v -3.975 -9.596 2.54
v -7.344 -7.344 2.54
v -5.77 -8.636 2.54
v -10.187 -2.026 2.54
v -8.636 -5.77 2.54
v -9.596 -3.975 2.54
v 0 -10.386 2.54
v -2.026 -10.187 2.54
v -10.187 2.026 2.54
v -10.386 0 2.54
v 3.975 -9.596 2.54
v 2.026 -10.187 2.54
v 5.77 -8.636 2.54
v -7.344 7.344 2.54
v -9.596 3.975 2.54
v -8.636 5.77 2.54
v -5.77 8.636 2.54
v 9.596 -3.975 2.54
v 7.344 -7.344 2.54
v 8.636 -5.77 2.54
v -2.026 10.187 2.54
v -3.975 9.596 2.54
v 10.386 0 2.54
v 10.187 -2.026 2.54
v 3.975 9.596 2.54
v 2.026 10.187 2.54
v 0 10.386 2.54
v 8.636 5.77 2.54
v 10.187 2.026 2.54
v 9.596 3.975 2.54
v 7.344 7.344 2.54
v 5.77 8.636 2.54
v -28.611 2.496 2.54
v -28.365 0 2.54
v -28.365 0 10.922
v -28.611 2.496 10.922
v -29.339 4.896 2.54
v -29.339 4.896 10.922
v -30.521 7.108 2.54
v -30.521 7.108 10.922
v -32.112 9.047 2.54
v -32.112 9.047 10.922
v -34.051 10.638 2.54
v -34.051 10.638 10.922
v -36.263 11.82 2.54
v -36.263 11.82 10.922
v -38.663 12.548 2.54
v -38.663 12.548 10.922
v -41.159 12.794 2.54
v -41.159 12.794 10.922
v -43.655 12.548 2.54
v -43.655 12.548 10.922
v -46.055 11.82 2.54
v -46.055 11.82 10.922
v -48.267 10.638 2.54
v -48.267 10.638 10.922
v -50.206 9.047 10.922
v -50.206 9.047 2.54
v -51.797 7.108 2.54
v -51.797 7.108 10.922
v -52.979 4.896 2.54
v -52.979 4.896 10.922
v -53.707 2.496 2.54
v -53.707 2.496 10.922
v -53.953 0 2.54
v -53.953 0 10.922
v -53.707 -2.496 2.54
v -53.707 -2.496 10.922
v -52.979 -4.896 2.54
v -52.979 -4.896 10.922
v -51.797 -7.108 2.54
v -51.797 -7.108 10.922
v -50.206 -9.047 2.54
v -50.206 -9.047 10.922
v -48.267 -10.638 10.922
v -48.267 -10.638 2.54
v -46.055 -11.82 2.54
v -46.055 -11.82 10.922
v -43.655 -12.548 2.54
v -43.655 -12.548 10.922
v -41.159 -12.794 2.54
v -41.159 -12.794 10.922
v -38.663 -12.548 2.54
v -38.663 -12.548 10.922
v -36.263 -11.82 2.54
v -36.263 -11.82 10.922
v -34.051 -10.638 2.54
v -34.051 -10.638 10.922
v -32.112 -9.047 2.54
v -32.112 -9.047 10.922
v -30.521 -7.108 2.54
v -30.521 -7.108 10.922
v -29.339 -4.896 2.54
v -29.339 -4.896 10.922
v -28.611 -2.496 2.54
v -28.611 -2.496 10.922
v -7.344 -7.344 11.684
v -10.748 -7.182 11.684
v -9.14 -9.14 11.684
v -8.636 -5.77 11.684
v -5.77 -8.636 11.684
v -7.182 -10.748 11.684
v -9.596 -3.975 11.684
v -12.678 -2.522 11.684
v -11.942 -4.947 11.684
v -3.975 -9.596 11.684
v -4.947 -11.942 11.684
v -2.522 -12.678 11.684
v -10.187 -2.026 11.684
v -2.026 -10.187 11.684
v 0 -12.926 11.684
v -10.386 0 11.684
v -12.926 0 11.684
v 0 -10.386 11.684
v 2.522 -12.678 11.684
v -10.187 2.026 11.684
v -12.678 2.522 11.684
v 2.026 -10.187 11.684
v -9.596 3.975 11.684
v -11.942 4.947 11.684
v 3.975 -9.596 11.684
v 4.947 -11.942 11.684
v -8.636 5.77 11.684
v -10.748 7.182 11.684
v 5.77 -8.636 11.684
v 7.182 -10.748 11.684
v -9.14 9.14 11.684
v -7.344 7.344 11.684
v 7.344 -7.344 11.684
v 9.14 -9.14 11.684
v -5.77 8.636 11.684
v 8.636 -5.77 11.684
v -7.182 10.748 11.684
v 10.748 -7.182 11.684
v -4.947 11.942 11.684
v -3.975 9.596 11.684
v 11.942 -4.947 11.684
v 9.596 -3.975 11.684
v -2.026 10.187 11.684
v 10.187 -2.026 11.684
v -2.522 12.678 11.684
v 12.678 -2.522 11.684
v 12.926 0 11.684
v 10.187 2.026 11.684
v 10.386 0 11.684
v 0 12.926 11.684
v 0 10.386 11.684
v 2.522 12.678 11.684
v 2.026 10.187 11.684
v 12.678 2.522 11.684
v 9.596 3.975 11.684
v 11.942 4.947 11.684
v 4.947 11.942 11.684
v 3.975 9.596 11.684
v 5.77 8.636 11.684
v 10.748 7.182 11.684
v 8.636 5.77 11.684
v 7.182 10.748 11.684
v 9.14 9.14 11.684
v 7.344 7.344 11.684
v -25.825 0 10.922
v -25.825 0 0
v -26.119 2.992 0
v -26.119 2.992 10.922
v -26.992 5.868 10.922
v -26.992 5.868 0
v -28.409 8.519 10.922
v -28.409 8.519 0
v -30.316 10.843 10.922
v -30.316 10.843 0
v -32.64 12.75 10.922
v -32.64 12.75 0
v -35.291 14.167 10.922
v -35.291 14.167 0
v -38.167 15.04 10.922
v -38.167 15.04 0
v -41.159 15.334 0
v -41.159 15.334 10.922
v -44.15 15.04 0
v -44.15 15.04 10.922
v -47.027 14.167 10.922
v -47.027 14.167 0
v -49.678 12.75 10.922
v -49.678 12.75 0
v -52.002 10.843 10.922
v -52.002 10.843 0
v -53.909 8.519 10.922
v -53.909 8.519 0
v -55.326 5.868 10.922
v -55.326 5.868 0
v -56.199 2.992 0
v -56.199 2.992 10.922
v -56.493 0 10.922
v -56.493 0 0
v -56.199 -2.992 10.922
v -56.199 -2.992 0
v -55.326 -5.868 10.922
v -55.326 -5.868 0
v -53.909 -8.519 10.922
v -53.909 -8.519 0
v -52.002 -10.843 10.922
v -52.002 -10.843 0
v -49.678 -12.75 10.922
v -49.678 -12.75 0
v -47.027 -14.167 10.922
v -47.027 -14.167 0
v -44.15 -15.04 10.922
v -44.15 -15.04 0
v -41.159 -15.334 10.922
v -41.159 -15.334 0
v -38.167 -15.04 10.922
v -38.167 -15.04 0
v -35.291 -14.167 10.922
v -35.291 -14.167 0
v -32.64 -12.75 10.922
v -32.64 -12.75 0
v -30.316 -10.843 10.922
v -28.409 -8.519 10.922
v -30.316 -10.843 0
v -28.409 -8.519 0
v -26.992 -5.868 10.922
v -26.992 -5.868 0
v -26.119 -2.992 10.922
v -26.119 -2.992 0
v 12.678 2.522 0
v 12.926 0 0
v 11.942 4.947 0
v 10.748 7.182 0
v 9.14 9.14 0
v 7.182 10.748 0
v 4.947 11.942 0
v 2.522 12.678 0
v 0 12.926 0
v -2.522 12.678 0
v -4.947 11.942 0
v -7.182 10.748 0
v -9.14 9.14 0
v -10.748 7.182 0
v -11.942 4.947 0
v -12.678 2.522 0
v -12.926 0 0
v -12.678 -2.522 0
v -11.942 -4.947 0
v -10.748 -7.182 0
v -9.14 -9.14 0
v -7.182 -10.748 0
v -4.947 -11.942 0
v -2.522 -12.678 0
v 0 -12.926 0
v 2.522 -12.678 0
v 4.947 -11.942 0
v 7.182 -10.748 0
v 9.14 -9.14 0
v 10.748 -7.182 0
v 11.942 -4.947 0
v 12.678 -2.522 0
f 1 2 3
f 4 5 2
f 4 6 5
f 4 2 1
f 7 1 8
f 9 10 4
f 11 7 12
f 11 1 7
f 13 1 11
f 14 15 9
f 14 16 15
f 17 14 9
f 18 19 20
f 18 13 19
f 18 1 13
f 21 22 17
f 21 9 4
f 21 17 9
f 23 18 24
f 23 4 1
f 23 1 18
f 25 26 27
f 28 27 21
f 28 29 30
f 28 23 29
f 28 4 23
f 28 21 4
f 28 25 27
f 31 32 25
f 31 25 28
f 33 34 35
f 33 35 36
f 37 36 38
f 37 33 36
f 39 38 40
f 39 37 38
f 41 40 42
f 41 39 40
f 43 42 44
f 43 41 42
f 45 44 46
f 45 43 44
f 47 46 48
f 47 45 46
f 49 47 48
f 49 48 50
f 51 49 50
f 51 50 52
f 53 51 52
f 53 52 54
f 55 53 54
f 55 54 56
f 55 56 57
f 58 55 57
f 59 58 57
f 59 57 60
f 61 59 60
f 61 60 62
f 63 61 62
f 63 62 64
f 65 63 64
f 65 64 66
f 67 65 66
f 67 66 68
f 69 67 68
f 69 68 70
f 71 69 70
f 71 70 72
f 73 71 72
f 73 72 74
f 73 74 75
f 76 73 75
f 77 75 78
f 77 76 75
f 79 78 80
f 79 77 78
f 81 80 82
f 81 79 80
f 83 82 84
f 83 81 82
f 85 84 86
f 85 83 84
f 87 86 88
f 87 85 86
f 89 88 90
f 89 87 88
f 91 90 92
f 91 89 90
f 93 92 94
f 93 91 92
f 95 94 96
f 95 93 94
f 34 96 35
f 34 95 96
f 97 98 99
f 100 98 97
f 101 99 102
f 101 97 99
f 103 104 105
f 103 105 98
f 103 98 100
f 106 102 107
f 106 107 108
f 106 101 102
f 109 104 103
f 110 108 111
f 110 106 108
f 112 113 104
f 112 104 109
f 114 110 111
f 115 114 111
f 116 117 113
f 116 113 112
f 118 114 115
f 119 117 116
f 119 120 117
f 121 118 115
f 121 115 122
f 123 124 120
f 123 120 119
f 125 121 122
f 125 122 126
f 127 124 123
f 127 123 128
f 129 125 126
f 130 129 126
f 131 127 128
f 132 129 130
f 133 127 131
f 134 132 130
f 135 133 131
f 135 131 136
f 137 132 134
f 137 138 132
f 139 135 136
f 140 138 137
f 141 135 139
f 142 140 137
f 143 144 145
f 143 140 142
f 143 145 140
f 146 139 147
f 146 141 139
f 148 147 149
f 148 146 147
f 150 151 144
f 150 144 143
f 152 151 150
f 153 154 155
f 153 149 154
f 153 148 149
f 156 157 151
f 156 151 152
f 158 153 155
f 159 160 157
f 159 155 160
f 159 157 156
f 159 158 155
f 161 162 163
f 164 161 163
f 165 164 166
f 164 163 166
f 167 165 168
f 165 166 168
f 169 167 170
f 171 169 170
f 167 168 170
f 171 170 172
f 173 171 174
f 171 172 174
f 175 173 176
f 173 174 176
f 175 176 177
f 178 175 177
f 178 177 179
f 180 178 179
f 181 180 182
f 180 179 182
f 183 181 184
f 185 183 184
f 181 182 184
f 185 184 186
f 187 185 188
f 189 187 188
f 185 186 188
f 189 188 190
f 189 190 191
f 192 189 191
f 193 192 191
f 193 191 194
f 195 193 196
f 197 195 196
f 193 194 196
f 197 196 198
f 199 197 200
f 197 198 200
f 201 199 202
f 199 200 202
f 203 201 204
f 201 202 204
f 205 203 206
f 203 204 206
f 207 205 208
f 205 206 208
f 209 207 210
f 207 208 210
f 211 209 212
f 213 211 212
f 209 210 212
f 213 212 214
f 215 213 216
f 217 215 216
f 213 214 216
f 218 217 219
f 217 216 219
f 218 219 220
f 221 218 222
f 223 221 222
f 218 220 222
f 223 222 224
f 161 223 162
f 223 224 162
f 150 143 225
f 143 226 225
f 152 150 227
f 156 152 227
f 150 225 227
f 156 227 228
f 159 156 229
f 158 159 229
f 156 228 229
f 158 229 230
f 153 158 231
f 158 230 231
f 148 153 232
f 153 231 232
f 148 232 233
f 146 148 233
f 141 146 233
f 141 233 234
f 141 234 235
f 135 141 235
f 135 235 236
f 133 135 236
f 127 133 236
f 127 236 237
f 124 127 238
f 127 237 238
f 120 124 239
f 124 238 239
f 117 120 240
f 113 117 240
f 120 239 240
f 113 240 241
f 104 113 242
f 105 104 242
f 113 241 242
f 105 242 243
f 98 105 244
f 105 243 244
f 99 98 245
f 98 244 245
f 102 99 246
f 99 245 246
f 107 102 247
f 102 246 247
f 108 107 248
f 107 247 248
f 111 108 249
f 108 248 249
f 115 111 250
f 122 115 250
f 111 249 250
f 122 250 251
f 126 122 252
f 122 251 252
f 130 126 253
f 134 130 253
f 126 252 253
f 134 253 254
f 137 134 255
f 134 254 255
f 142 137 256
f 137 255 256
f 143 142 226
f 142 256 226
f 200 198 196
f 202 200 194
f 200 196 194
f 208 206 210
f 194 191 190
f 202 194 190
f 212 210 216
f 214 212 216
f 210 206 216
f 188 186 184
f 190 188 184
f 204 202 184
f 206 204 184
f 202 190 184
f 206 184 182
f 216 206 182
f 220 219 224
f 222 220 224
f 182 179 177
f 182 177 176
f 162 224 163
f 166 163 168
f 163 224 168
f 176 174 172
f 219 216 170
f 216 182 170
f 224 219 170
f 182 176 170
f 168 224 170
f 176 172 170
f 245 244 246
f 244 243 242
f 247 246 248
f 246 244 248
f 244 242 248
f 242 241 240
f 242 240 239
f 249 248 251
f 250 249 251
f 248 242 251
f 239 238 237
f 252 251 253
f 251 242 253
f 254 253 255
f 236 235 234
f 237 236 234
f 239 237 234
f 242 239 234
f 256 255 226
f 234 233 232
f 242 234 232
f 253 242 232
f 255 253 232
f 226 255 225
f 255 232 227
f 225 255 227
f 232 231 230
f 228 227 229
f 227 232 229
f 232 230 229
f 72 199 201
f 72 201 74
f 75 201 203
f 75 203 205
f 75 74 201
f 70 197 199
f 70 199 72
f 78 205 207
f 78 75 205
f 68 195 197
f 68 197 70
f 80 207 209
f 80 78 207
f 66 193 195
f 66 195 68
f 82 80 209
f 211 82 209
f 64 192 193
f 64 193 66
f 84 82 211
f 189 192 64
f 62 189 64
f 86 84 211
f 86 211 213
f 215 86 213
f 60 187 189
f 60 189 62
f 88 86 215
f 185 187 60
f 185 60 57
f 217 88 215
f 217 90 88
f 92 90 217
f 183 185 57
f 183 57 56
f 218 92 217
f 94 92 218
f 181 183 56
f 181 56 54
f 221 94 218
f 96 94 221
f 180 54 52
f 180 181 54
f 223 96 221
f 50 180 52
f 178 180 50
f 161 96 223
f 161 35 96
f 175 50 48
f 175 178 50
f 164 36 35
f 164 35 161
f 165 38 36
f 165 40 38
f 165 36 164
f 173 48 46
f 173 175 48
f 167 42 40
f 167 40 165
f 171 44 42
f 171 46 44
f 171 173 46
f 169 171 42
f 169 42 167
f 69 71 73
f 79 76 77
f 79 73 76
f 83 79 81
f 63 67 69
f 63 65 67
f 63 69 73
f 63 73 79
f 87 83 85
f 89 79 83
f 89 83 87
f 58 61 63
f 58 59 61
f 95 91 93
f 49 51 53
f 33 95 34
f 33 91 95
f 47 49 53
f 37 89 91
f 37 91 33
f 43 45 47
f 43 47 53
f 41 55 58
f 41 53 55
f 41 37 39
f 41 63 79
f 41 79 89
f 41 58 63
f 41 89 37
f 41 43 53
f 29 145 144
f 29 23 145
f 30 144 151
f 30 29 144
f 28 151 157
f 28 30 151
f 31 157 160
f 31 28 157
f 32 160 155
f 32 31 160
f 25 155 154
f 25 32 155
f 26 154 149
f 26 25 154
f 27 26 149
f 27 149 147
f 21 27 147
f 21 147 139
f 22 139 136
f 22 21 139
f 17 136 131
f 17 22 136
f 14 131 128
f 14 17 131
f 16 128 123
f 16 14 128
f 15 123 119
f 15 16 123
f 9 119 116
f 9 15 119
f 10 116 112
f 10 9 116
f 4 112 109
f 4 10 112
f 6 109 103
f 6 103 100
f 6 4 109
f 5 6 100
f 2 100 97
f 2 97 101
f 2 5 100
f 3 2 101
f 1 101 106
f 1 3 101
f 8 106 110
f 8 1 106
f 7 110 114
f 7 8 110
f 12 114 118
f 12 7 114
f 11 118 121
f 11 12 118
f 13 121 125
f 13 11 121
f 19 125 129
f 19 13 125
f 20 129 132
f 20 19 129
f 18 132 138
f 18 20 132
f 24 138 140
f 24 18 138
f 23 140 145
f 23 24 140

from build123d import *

# Parameters (mm, degrees)
F0_R     = 12.9264196596
F1_DEPTH = 7.112
F2_T     = -2.54
F3_DEPTH = 4.572
F4_R     = 15.334226066
F5_DEPTH = 10.922
F6_T     = -2.54


with BuildPart() as f1:
    # F0 (on Top) → F1 (new body)
    with BuildSketch(Plane.XY):
        Circle(F0_R)
    extrude(amount=F1_DEPTH)

    # F2
    f2_openings = [f1.faces().sort_by_distance(p)[0] for p in [
        (0, 0, 7.112),
    ]]
    offset(amount=F2_T, openings=f2_openings)

    # F3 (add): a face of the model
    f3_faces = [f1.faces().sort_by_distance(p)[0] for p in [
        (-12.5608052997, 0, 7.112),
    ]]
    extrude(f3_faces, amount=F3_DEPTH)


with BuildPart() as f5:
    # F4 (on Top) → F5 (new body)
    with BuildSketch(Plane.XY):
        with Locations((-41.1589220166, 0)):
            Circle(F4_R)
    extrude(amount=F5_DEPTH)

    # F6
    f6_openings = [f5.faces().sort_by_distance(p)[0] for p in [
        (-41.158922, 0, 10.922),
    ]]
    offset(amount=F6_T, openings=f6_openings)


solid = Compound([f1.part, f5.part])
